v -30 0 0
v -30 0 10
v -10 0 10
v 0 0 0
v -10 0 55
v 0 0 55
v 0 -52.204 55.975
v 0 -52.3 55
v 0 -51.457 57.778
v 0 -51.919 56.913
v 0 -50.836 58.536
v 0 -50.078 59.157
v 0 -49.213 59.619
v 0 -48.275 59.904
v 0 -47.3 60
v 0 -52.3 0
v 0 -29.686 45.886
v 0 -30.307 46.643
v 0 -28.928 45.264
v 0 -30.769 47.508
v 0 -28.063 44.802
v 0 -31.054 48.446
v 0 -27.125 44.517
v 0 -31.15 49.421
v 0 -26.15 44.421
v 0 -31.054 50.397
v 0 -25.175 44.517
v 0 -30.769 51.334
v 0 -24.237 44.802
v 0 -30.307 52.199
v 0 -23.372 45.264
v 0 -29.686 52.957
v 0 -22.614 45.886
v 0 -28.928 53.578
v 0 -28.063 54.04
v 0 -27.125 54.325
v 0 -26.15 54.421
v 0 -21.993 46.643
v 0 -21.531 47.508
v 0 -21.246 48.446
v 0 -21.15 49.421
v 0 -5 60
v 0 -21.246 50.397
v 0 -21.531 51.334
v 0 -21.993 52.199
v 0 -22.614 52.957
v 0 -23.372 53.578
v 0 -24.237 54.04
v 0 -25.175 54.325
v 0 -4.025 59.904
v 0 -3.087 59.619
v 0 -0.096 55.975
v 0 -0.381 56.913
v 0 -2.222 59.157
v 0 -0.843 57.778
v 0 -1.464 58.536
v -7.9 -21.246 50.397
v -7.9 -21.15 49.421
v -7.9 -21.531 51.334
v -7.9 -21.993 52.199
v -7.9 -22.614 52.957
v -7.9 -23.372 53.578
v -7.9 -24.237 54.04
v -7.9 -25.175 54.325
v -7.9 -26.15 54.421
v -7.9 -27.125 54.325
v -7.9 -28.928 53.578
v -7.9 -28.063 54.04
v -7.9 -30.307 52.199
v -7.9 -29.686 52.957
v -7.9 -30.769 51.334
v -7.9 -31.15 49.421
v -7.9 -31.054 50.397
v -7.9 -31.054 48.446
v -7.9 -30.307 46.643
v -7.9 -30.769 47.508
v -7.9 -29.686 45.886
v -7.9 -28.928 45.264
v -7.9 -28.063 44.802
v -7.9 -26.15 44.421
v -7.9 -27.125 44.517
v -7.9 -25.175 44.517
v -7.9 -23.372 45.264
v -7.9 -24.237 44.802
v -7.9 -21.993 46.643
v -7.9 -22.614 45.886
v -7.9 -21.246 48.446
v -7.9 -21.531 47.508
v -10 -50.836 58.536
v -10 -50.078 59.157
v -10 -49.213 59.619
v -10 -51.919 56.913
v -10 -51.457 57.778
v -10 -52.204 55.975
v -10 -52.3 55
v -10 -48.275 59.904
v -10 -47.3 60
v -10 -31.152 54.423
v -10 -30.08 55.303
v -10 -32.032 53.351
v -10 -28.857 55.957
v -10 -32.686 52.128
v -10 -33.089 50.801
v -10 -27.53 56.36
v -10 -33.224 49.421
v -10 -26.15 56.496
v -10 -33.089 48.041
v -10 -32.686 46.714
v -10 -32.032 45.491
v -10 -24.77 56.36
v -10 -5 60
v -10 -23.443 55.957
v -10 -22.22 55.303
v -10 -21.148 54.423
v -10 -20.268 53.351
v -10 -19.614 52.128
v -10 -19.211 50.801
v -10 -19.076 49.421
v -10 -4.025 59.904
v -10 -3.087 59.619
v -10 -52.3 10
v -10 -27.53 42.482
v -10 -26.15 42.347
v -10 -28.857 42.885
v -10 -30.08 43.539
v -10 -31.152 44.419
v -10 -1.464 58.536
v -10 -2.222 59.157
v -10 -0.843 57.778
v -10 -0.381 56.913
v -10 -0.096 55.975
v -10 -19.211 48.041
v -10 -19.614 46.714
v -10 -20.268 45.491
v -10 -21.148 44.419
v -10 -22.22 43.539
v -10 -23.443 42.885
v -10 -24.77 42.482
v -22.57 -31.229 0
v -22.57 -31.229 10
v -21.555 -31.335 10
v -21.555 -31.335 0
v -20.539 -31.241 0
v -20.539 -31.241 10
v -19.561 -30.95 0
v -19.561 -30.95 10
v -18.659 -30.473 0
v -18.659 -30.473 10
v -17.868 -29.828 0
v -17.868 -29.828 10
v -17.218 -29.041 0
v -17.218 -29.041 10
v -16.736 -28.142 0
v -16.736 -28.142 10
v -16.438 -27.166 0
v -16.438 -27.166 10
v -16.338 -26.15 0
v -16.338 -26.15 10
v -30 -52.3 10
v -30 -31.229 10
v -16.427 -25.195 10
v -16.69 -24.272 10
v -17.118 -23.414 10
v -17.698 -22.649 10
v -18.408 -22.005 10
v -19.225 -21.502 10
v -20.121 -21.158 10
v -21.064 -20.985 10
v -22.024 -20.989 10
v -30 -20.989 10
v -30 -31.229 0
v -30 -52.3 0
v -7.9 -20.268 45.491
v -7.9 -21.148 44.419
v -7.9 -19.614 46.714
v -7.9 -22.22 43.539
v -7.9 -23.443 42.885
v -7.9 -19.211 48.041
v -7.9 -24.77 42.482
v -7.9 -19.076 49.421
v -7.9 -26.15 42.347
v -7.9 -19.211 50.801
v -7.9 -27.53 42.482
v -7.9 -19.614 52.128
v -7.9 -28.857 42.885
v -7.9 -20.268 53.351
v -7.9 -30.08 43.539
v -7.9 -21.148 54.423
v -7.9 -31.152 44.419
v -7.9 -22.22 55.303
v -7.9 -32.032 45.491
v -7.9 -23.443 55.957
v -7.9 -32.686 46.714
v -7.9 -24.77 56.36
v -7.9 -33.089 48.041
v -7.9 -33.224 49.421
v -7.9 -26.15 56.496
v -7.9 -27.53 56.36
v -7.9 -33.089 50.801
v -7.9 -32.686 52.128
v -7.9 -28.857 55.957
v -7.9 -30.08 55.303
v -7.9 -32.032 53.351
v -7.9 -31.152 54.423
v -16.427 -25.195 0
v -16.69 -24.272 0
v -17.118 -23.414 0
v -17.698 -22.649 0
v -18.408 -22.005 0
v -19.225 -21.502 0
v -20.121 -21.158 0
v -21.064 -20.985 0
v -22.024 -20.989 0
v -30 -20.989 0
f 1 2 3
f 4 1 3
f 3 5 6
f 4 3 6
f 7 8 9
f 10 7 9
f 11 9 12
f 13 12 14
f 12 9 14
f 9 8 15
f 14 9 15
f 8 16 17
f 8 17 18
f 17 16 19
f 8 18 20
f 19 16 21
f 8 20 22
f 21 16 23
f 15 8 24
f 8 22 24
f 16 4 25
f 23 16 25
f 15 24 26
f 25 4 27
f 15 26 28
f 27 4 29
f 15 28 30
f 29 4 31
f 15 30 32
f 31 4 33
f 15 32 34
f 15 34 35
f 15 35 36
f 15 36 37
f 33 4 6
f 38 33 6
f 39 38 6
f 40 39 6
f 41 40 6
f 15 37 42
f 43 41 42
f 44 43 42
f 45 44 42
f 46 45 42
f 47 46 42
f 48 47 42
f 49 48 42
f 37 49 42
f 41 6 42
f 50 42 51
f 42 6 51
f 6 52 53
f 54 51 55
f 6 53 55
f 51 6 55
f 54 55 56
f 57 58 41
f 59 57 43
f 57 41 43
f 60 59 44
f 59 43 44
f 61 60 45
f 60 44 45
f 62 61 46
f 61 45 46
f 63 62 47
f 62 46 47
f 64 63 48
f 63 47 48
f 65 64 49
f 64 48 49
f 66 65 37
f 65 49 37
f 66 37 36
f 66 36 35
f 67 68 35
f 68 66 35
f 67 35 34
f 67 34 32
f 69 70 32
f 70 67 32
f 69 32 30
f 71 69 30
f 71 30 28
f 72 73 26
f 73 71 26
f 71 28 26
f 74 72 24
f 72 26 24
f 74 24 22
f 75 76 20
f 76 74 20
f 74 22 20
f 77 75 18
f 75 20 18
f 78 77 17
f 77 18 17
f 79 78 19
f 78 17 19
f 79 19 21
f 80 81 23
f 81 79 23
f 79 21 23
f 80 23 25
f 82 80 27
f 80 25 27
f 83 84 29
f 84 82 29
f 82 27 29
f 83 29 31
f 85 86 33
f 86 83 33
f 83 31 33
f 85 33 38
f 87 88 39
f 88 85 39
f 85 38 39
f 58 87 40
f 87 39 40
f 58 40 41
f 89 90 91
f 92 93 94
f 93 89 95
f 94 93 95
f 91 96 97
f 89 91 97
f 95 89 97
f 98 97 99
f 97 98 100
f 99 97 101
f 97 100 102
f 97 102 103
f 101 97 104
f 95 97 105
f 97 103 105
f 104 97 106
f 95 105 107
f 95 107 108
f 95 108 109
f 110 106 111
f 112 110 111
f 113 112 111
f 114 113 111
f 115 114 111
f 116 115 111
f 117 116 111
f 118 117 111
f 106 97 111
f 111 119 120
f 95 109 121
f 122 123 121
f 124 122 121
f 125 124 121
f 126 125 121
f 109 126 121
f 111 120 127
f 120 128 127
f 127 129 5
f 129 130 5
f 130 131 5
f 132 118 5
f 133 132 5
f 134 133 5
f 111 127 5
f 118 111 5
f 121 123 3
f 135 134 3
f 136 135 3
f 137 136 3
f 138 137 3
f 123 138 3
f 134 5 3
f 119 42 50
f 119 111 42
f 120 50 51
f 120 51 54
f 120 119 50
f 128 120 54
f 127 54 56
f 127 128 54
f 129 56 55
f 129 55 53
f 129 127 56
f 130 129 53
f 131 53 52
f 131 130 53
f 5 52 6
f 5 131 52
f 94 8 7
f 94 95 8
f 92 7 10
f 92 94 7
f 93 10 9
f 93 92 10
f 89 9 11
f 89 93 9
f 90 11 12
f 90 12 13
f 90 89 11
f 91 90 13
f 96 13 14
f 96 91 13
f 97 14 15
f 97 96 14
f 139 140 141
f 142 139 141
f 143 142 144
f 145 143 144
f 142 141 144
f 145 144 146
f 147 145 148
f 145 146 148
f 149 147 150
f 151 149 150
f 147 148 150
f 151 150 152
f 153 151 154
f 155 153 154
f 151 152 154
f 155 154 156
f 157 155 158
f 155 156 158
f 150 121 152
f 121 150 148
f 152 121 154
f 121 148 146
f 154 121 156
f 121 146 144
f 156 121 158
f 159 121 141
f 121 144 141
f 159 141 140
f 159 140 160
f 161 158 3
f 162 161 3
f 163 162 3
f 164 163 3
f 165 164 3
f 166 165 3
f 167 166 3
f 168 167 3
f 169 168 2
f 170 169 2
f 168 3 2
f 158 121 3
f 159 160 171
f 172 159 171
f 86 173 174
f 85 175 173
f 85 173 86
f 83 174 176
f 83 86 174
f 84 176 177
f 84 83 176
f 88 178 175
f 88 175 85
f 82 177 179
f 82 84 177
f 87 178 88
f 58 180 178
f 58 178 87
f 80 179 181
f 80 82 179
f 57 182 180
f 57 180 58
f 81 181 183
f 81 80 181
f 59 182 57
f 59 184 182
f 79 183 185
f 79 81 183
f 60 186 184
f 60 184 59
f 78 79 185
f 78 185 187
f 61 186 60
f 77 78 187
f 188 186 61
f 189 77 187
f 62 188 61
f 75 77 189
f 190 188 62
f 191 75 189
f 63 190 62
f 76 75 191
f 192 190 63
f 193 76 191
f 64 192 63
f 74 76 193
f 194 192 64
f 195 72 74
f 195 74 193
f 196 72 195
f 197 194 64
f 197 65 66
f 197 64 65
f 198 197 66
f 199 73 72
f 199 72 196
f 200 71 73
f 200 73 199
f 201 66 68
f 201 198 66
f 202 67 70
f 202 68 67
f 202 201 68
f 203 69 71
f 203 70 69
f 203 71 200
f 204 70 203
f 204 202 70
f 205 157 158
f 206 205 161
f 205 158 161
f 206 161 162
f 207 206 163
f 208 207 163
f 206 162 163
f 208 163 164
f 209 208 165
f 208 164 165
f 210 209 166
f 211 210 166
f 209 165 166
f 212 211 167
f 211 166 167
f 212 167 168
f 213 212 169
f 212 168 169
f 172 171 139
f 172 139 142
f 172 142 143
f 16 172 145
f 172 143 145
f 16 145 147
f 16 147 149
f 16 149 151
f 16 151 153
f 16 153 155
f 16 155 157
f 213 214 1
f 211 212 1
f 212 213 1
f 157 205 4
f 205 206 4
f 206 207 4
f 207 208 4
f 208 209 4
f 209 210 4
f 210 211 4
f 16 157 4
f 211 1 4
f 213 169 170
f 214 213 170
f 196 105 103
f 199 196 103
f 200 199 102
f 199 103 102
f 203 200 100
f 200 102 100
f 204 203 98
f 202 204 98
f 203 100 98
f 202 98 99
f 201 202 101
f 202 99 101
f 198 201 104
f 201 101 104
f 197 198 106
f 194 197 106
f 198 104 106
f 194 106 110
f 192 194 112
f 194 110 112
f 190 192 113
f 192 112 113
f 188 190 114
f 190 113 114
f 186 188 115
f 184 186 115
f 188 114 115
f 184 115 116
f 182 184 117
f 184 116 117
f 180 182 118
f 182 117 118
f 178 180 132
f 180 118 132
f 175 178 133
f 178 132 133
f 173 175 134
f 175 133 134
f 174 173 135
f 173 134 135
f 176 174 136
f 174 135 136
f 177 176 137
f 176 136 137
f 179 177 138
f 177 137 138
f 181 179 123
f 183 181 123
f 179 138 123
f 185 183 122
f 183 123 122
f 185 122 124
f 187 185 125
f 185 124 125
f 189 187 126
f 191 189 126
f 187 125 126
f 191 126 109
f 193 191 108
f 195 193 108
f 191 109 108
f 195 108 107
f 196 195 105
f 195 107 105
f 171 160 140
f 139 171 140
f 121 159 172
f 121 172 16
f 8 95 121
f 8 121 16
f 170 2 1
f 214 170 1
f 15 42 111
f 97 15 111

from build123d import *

# Parameters (mm, degrees)
F1_DEPTH  = 52.3
F2_R      = 5
F3_DEPTH  = 12.5
F4_R      = 5
F5_R      = 5
F6_R      = 7.07449
F6_R_2    = 5
F8_DEPTH  = 2.1
F10_DEPTH = 25


with BuildPart() as f1:
    # F0 (on Front) → F1 (new body)
    with BuildSketch(Plane.XZ):
        Polygon((0, 0), (0, 60), (-10, 60), (-10, 10), (-30, 10), (-30, 0), align=None)
    extrude(amount=F1_DEPTH)

    # F2 (on face) → F3 (cut, symmetric)
    with BuildSketch(Plane.YZ):
        with Locations((-26.15, 49.421053)):
            Circle(F2_R)
    extrude(amount=F3_DEPTH, both=True, mode=Mode.SUBTRACT)

    # F4
    f4_edges = [f1.edges().sort_by_distance(p)[0] for p in [
        (-5, -52.3, 60),
    ]]
    fillet(f4_edges, radius=F4_R)

    # F5
    f5_edges = [f1.edges().sort_by_distance(p)[0] for p in [
        (-5, 0, 60),
    ]]
    fillet(f5_edges, radius=F5_R)

    # F6 (on face) → F8 (cut)
    with BuildSketch(Plane(origin=(-10, 0, 0), x_dir=(0, -1, 0), z_dir=(-1, 0, 0))):
        with Locations((26.15, 49.421053)):
            Circle(F6_R)
        with Locations((26.15, 49.421053)):
            Circle(F6_R_2, mode=Mode.SUBTRACT)
    extrude(amount=-F8_DEPTH, mode=Mode.SUBTRACT)

    # F9 (on face) → F10 (cut)
    with BuildSketch(Plane.XY.offset(10)):
        with BuildLine():
            ThreePointArc((-22.569968, -31.228698), (-18.247574, -30.169685), (-16.337931, -26.15))
            ThreePointArc((-16.337931, -26.15), (-18.038064, -22.310553), (-22.023625, -20.988769))
            ThreePointArc((-22.023625, -20.988769), (-26.701406, -25.873729), (-22.569968, -31.228698))
        make_face()
        with BuildLine():
            ThreePointArc((-22.569968, -31.228698), (-26.701406, -25.873729), (-22.023625, -20.988769))
            Line((-22.023625, -20.988769), (-30, -20.988769))
            Line((-30, -20.988769), (-30, -31.228698))
            Line((-30, -31.228698), (-22.569968, -31.228698))
        make_face()
    extrude(amount=-F10_DEPTH, mode=Mode.SUBTRACT)


solid = f1.part
